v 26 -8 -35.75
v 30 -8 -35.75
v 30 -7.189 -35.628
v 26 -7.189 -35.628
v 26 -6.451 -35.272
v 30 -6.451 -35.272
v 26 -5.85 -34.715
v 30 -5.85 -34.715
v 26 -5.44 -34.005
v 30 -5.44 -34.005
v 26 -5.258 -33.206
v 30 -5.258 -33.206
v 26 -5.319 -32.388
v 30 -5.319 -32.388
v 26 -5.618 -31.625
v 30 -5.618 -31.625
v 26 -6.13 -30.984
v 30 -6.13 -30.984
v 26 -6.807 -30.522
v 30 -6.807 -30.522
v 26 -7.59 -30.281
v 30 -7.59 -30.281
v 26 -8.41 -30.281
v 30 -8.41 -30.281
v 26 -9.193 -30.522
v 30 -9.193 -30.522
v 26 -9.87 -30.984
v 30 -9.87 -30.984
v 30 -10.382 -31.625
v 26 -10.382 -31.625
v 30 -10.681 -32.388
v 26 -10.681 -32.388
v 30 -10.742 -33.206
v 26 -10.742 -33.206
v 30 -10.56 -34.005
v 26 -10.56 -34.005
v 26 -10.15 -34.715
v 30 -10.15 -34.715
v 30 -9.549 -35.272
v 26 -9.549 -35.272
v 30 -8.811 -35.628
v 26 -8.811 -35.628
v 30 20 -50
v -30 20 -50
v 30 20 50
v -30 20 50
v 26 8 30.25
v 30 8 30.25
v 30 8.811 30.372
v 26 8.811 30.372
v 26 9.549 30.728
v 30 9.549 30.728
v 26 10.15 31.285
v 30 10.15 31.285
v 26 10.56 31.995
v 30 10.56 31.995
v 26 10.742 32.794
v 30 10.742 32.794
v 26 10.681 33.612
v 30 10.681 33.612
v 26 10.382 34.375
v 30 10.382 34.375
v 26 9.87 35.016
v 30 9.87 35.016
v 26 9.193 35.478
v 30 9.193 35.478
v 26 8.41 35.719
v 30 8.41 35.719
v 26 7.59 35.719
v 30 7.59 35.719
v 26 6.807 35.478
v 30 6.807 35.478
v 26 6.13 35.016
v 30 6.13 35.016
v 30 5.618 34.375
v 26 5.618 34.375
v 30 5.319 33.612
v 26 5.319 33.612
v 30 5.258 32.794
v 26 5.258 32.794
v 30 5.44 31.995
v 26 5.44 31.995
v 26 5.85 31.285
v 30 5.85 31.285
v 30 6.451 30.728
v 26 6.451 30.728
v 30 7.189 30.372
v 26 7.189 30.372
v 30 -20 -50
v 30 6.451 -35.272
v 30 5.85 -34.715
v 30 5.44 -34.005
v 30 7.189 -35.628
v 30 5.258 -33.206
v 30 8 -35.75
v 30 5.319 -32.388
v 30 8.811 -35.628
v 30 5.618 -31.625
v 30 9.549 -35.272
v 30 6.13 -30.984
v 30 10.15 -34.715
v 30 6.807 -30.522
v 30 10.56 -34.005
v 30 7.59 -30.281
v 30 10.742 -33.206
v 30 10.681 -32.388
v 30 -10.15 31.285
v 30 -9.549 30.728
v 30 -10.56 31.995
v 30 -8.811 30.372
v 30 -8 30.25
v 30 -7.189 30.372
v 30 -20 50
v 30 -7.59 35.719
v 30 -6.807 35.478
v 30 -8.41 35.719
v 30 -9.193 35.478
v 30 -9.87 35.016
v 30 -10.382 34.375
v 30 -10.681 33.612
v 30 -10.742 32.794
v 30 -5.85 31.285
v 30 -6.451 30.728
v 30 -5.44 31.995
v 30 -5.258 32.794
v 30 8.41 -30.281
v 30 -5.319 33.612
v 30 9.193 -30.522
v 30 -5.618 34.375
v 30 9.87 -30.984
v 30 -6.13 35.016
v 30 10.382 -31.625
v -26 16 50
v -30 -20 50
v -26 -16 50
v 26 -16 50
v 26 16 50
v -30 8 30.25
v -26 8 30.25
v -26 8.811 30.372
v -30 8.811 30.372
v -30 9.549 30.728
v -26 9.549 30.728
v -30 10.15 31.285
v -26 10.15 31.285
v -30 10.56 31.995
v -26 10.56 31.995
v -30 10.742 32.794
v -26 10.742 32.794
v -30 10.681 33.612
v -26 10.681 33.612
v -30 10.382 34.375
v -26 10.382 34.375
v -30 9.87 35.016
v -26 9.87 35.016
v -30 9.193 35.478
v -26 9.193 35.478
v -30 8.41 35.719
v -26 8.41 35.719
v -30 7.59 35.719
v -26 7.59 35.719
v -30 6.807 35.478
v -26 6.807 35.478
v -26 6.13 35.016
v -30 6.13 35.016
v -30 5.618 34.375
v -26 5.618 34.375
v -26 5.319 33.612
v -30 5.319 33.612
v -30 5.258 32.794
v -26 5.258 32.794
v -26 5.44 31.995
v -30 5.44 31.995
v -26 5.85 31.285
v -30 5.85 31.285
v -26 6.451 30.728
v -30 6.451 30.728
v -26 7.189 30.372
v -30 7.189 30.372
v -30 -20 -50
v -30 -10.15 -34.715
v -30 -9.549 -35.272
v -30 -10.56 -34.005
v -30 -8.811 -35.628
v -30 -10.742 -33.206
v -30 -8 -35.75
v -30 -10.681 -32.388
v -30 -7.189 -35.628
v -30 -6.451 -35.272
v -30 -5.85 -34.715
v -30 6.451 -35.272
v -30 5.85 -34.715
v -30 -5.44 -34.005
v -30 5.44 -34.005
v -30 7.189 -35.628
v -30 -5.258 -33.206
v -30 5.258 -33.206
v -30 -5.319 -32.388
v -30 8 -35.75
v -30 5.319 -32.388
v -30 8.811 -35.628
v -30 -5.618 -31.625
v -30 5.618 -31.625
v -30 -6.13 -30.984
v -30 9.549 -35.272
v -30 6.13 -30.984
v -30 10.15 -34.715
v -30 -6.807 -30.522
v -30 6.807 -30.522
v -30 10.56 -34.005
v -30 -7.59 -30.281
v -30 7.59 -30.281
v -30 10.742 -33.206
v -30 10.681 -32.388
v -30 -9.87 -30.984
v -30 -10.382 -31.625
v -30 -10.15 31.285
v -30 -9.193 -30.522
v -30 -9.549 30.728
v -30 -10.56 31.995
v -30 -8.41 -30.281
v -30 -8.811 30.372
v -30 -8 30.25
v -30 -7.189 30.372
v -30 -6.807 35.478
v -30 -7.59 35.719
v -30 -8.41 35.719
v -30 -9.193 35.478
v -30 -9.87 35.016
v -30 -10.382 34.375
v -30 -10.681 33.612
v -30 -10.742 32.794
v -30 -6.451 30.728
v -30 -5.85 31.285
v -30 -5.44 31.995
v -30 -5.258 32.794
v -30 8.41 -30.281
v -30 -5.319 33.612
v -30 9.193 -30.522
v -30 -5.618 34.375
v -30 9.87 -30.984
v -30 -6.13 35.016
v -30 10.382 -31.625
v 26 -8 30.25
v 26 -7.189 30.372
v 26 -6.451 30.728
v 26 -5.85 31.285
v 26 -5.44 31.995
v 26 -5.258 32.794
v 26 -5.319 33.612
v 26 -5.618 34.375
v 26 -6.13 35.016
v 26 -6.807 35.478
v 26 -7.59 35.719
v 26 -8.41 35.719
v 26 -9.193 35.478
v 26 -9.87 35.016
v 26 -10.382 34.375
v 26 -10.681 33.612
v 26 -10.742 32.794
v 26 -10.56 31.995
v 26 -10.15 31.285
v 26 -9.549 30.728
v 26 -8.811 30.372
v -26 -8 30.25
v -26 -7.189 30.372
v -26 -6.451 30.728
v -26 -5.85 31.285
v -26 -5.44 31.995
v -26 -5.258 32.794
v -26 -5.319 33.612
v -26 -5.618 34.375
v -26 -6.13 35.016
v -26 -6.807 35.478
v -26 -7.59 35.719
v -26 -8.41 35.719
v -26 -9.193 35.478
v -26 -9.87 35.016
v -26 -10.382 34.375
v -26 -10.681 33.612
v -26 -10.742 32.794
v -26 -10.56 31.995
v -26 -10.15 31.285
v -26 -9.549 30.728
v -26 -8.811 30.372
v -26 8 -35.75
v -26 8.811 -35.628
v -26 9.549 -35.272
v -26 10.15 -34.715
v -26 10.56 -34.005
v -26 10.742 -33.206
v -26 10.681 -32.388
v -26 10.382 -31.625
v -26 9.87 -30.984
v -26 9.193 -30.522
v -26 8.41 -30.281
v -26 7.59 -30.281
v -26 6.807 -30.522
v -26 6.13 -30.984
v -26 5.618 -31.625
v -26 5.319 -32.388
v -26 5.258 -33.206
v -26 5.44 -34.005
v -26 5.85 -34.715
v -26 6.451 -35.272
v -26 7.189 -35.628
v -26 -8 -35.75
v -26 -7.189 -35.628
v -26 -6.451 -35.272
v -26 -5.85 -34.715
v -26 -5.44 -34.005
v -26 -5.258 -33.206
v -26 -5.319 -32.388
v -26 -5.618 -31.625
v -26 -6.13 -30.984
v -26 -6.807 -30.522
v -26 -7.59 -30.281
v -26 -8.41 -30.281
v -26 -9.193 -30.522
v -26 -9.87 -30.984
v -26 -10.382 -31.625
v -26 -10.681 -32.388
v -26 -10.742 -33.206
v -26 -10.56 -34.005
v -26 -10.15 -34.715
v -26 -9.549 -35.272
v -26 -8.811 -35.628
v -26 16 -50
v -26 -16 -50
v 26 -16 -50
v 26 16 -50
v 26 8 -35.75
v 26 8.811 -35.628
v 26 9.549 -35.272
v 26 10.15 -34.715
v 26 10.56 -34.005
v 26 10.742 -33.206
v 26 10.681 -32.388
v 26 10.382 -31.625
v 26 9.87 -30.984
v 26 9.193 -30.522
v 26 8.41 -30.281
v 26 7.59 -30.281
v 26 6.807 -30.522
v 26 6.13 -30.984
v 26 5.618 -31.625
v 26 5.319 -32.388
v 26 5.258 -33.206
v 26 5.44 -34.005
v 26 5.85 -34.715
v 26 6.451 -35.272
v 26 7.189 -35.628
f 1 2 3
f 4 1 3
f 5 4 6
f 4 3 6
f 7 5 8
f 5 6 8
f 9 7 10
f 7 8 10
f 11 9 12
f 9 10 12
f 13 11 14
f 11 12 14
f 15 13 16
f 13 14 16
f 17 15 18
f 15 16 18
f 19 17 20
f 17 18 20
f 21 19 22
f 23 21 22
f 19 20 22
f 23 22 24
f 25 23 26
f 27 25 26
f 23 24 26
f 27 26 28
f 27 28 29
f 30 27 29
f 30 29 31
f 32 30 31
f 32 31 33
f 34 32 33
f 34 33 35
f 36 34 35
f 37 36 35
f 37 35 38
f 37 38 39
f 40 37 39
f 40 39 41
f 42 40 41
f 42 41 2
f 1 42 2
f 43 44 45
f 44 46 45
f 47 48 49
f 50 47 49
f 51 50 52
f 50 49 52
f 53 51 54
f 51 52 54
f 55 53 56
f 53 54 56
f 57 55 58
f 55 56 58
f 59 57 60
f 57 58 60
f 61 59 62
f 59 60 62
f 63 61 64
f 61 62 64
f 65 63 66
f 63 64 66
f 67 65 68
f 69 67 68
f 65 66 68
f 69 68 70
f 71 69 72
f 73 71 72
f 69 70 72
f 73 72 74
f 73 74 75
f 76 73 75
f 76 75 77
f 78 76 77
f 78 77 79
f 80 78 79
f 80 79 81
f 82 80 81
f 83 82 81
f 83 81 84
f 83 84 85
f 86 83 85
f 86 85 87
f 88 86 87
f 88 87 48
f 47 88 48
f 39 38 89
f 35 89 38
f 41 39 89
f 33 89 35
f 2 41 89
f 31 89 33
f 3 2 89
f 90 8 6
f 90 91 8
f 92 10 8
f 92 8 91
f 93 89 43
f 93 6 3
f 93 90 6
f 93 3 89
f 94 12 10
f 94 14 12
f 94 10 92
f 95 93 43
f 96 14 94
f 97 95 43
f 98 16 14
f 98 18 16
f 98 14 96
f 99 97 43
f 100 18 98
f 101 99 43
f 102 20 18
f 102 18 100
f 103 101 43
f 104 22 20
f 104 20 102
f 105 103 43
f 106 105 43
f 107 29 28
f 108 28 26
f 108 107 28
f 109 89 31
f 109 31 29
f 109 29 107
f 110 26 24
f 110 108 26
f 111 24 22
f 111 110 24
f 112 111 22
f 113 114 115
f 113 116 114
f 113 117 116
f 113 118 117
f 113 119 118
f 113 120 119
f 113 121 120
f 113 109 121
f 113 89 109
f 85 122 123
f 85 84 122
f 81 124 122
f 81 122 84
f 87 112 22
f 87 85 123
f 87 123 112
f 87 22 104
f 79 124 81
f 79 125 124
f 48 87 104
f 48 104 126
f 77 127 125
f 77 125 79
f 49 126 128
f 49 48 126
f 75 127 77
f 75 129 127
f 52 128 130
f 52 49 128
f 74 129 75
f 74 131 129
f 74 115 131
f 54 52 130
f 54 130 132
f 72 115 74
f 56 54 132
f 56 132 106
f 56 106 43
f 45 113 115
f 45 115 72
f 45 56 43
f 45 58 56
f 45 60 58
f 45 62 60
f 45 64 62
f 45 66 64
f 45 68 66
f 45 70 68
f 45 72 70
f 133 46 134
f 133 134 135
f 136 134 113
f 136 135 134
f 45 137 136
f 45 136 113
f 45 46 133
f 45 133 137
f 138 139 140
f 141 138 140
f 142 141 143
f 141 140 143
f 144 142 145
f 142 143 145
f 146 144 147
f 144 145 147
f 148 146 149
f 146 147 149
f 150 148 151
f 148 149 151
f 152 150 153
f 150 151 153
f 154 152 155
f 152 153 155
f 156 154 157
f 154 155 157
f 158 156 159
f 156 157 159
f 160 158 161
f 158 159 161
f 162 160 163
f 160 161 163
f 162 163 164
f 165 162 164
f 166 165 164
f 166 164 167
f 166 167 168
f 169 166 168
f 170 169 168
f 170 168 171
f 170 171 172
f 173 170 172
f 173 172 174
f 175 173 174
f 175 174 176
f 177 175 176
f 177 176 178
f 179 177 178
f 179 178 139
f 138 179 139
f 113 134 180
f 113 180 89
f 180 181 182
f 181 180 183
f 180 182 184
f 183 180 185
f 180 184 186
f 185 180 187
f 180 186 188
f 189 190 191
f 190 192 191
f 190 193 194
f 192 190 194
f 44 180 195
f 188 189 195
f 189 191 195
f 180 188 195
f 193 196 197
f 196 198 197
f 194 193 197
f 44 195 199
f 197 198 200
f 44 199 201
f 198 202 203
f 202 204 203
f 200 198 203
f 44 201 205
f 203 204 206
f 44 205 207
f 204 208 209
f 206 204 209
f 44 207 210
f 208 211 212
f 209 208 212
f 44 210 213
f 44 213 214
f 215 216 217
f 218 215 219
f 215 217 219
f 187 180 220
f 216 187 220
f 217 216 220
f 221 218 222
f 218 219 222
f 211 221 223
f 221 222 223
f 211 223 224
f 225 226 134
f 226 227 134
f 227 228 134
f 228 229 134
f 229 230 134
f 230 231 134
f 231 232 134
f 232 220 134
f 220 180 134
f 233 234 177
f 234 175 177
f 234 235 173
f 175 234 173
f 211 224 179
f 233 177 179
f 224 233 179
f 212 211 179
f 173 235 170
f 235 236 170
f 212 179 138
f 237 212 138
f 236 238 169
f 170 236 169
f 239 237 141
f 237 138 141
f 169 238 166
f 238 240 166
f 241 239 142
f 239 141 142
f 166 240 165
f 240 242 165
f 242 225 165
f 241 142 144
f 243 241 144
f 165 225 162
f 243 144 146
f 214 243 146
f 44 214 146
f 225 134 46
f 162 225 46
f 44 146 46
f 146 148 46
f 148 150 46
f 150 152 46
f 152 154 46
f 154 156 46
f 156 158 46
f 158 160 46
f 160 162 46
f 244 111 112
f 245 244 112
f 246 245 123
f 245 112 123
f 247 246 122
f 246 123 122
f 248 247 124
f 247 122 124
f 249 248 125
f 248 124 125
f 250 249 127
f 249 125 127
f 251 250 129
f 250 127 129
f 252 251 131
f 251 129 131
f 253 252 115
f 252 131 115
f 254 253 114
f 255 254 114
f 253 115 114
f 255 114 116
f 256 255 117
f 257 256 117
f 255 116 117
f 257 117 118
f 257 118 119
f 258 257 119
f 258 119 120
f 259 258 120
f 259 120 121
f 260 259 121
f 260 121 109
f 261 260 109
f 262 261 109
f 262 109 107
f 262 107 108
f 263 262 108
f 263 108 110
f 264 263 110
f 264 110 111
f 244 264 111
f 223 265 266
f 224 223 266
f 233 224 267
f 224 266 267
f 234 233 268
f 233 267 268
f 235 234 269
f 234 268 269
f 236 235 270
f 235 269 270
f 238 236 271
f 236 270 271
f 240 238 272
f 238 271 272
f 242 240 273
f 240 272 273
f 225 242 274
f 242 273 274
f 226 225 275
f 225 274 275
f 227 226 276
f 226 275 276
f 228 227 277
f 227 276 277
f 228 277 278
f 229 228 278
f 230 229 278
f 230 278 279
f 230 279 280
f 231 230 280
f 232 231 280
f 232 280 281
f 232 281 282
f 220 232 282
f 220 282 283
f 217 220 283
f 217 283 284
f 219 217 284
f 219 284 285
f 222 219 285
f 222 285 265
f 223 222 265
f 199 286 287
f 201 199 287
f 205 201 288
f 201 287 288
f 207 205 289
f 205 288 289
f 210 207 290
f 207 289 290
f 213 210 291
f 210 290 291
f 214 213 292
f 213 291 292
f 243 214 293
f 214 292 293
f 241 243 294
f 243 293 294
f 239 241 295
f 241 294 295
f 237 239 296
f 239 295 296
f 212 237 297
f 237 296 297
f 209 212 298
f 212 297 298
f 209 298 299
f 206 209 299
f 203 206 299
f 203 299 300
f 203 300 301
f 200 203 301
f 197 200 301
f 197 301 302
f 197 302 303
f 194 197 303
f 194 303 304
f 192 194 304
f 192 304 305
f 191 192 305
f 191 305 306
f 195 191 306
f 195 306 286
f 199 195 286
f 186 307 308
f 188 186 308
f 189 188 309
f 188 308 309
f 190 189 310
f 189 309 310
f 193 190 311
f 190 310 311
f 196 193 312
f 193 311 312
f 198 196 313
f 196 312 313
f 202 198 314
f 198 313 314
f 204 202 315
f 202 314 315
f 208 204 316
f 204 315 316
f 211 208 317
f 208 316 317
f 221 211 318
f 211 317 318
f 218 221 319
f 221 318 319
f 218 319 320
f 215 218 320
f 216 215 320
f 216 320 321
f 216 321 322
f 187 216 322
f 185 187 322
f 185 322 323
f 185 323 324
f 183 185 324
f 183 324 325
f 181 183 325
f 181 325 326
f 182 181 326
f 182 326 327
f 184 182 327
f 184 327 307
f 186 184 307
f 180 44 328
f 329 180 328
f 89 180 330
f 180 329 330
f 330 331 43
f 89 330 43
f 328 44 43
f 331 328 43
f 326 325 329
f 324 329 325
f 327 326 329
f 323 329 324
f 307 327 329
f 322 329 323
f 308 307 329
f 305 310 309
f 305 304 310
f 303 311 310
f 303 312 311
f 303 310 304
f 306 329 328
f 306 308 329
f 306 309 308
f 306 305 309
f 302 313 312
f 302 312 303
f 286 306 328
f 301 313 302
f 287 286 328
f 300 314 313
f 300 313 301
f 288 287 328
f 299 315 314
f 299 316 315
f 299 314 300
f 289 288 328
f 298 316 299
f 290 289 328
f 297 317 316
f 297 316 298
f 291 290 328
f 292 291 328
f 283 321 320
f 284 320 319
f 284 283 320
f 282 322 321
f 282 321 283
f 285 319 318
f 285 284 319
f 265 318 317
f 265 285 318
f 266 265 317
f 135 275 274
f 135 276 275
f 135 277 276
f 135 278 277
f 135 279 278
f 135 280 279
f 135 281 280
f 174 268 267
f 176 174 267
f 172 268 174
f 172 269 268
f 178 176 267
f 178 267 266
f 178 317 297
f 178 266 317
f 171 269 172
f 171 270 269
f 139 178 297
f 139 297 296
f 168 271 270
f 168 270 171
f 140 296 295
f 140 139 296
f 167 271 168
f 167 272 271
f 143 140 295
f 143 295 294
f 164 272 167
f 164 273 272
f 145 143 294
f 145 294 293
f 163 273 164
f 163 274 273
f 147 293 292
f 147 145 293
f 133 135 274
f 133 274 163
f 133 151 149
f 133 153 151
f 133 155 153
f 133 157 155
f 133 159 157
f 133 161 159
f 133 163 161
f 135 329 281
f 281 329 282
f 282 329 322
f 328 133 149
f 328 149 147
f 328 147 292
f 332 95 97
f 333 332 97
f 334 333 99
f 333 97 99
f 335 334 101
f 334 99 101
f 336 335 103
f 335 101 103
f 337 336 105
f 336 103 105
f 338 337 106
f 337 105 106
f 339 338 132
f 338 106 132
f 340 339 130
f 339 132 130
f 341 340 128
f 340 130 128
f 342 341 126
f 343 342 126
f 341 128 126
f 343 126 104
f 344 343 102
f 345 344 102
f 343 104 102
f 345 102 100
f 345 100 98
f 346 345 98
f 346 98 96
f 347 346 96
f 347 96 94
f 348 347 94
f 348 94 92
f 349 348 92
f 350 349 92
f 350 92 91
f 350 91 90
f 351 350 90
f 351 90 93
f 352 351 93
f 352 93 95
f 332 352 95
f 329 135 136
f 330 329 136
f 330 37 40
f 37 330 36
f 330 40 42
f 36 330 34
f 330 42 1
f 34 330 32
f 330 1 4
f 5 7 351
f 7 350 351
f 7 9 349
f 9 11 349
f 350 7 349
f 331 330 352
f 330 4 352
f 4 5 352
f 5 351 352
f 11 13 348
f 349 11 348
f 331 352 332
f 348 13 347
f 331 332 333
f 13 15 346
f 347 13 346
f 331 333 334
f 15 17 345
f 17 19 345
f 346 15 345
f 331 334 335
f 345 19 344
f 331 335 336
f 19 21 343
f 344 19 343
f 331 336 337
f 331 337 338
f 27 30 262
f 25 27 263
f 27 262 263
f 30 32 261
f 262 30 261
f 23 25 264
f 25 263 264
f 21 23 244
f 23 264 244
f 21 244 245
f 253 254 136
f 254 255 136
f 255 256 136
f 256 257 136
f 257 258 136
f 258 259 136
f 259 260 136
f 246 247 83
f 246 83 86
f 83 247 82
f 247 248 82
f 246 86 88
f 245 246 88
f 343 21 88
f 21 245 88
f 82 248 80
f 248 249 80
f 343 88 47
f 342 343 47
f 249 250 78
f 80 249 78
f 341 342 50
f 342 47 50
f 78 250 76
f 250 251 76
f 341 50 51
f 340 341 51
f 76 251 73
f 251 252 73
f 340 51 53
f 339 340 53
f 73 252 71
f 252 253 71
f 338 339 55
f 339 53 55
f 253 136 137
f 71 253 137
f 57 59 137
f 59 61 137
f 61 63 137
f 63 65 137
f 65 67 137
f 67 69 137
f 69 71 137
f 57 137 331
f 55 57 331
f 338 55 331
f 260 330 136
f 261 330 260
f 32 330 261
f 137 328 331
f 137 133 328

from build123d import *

# Parameters (mm, degrees)
EXTRUDE_3_DEPTH         = 50
EXTRUDE_3_DEPTH_BACK    = 50
SKETCH_2_W              = 60
SKETCH_2_H              = 40
SKETCH_2_W_2            = 52
SKETCH_2_H_2            = 32
HOLE_WIZARD_5_5_5_5_1_D = 5.5


with BuildPart() as part:
    # Эскиз2 → Бобышка-Вытянуть3 (new, two sides: drawn at the far end of the back side and taken through both)
    with BuildSketch(Plane.XY.offset(-EXTRUDE_3_DEPTH_BACK)):
        Rectangle(SKETCH_2_W, SKETCH_2_H)
        Rectangle(SKETCH_2_W_2, SKETCH_2_H_2, mode=Mode.SUBTRACT)
    extrude(amount=EXTRUDE_3_DEPTH + EXTRUDE_3_DEPTH_BACK)

    # Диаметр отверстия Ø5.5 (5.5)1 (through all)
    with Locations(Plane.ZY.offset(30)):
        with Locations((-33, 8), (-33, -8), (33, 8), (33, -8)):
            Hole(HOLE_WIZARD_5_5_5_5_1_D / 2)


solid = part.part
